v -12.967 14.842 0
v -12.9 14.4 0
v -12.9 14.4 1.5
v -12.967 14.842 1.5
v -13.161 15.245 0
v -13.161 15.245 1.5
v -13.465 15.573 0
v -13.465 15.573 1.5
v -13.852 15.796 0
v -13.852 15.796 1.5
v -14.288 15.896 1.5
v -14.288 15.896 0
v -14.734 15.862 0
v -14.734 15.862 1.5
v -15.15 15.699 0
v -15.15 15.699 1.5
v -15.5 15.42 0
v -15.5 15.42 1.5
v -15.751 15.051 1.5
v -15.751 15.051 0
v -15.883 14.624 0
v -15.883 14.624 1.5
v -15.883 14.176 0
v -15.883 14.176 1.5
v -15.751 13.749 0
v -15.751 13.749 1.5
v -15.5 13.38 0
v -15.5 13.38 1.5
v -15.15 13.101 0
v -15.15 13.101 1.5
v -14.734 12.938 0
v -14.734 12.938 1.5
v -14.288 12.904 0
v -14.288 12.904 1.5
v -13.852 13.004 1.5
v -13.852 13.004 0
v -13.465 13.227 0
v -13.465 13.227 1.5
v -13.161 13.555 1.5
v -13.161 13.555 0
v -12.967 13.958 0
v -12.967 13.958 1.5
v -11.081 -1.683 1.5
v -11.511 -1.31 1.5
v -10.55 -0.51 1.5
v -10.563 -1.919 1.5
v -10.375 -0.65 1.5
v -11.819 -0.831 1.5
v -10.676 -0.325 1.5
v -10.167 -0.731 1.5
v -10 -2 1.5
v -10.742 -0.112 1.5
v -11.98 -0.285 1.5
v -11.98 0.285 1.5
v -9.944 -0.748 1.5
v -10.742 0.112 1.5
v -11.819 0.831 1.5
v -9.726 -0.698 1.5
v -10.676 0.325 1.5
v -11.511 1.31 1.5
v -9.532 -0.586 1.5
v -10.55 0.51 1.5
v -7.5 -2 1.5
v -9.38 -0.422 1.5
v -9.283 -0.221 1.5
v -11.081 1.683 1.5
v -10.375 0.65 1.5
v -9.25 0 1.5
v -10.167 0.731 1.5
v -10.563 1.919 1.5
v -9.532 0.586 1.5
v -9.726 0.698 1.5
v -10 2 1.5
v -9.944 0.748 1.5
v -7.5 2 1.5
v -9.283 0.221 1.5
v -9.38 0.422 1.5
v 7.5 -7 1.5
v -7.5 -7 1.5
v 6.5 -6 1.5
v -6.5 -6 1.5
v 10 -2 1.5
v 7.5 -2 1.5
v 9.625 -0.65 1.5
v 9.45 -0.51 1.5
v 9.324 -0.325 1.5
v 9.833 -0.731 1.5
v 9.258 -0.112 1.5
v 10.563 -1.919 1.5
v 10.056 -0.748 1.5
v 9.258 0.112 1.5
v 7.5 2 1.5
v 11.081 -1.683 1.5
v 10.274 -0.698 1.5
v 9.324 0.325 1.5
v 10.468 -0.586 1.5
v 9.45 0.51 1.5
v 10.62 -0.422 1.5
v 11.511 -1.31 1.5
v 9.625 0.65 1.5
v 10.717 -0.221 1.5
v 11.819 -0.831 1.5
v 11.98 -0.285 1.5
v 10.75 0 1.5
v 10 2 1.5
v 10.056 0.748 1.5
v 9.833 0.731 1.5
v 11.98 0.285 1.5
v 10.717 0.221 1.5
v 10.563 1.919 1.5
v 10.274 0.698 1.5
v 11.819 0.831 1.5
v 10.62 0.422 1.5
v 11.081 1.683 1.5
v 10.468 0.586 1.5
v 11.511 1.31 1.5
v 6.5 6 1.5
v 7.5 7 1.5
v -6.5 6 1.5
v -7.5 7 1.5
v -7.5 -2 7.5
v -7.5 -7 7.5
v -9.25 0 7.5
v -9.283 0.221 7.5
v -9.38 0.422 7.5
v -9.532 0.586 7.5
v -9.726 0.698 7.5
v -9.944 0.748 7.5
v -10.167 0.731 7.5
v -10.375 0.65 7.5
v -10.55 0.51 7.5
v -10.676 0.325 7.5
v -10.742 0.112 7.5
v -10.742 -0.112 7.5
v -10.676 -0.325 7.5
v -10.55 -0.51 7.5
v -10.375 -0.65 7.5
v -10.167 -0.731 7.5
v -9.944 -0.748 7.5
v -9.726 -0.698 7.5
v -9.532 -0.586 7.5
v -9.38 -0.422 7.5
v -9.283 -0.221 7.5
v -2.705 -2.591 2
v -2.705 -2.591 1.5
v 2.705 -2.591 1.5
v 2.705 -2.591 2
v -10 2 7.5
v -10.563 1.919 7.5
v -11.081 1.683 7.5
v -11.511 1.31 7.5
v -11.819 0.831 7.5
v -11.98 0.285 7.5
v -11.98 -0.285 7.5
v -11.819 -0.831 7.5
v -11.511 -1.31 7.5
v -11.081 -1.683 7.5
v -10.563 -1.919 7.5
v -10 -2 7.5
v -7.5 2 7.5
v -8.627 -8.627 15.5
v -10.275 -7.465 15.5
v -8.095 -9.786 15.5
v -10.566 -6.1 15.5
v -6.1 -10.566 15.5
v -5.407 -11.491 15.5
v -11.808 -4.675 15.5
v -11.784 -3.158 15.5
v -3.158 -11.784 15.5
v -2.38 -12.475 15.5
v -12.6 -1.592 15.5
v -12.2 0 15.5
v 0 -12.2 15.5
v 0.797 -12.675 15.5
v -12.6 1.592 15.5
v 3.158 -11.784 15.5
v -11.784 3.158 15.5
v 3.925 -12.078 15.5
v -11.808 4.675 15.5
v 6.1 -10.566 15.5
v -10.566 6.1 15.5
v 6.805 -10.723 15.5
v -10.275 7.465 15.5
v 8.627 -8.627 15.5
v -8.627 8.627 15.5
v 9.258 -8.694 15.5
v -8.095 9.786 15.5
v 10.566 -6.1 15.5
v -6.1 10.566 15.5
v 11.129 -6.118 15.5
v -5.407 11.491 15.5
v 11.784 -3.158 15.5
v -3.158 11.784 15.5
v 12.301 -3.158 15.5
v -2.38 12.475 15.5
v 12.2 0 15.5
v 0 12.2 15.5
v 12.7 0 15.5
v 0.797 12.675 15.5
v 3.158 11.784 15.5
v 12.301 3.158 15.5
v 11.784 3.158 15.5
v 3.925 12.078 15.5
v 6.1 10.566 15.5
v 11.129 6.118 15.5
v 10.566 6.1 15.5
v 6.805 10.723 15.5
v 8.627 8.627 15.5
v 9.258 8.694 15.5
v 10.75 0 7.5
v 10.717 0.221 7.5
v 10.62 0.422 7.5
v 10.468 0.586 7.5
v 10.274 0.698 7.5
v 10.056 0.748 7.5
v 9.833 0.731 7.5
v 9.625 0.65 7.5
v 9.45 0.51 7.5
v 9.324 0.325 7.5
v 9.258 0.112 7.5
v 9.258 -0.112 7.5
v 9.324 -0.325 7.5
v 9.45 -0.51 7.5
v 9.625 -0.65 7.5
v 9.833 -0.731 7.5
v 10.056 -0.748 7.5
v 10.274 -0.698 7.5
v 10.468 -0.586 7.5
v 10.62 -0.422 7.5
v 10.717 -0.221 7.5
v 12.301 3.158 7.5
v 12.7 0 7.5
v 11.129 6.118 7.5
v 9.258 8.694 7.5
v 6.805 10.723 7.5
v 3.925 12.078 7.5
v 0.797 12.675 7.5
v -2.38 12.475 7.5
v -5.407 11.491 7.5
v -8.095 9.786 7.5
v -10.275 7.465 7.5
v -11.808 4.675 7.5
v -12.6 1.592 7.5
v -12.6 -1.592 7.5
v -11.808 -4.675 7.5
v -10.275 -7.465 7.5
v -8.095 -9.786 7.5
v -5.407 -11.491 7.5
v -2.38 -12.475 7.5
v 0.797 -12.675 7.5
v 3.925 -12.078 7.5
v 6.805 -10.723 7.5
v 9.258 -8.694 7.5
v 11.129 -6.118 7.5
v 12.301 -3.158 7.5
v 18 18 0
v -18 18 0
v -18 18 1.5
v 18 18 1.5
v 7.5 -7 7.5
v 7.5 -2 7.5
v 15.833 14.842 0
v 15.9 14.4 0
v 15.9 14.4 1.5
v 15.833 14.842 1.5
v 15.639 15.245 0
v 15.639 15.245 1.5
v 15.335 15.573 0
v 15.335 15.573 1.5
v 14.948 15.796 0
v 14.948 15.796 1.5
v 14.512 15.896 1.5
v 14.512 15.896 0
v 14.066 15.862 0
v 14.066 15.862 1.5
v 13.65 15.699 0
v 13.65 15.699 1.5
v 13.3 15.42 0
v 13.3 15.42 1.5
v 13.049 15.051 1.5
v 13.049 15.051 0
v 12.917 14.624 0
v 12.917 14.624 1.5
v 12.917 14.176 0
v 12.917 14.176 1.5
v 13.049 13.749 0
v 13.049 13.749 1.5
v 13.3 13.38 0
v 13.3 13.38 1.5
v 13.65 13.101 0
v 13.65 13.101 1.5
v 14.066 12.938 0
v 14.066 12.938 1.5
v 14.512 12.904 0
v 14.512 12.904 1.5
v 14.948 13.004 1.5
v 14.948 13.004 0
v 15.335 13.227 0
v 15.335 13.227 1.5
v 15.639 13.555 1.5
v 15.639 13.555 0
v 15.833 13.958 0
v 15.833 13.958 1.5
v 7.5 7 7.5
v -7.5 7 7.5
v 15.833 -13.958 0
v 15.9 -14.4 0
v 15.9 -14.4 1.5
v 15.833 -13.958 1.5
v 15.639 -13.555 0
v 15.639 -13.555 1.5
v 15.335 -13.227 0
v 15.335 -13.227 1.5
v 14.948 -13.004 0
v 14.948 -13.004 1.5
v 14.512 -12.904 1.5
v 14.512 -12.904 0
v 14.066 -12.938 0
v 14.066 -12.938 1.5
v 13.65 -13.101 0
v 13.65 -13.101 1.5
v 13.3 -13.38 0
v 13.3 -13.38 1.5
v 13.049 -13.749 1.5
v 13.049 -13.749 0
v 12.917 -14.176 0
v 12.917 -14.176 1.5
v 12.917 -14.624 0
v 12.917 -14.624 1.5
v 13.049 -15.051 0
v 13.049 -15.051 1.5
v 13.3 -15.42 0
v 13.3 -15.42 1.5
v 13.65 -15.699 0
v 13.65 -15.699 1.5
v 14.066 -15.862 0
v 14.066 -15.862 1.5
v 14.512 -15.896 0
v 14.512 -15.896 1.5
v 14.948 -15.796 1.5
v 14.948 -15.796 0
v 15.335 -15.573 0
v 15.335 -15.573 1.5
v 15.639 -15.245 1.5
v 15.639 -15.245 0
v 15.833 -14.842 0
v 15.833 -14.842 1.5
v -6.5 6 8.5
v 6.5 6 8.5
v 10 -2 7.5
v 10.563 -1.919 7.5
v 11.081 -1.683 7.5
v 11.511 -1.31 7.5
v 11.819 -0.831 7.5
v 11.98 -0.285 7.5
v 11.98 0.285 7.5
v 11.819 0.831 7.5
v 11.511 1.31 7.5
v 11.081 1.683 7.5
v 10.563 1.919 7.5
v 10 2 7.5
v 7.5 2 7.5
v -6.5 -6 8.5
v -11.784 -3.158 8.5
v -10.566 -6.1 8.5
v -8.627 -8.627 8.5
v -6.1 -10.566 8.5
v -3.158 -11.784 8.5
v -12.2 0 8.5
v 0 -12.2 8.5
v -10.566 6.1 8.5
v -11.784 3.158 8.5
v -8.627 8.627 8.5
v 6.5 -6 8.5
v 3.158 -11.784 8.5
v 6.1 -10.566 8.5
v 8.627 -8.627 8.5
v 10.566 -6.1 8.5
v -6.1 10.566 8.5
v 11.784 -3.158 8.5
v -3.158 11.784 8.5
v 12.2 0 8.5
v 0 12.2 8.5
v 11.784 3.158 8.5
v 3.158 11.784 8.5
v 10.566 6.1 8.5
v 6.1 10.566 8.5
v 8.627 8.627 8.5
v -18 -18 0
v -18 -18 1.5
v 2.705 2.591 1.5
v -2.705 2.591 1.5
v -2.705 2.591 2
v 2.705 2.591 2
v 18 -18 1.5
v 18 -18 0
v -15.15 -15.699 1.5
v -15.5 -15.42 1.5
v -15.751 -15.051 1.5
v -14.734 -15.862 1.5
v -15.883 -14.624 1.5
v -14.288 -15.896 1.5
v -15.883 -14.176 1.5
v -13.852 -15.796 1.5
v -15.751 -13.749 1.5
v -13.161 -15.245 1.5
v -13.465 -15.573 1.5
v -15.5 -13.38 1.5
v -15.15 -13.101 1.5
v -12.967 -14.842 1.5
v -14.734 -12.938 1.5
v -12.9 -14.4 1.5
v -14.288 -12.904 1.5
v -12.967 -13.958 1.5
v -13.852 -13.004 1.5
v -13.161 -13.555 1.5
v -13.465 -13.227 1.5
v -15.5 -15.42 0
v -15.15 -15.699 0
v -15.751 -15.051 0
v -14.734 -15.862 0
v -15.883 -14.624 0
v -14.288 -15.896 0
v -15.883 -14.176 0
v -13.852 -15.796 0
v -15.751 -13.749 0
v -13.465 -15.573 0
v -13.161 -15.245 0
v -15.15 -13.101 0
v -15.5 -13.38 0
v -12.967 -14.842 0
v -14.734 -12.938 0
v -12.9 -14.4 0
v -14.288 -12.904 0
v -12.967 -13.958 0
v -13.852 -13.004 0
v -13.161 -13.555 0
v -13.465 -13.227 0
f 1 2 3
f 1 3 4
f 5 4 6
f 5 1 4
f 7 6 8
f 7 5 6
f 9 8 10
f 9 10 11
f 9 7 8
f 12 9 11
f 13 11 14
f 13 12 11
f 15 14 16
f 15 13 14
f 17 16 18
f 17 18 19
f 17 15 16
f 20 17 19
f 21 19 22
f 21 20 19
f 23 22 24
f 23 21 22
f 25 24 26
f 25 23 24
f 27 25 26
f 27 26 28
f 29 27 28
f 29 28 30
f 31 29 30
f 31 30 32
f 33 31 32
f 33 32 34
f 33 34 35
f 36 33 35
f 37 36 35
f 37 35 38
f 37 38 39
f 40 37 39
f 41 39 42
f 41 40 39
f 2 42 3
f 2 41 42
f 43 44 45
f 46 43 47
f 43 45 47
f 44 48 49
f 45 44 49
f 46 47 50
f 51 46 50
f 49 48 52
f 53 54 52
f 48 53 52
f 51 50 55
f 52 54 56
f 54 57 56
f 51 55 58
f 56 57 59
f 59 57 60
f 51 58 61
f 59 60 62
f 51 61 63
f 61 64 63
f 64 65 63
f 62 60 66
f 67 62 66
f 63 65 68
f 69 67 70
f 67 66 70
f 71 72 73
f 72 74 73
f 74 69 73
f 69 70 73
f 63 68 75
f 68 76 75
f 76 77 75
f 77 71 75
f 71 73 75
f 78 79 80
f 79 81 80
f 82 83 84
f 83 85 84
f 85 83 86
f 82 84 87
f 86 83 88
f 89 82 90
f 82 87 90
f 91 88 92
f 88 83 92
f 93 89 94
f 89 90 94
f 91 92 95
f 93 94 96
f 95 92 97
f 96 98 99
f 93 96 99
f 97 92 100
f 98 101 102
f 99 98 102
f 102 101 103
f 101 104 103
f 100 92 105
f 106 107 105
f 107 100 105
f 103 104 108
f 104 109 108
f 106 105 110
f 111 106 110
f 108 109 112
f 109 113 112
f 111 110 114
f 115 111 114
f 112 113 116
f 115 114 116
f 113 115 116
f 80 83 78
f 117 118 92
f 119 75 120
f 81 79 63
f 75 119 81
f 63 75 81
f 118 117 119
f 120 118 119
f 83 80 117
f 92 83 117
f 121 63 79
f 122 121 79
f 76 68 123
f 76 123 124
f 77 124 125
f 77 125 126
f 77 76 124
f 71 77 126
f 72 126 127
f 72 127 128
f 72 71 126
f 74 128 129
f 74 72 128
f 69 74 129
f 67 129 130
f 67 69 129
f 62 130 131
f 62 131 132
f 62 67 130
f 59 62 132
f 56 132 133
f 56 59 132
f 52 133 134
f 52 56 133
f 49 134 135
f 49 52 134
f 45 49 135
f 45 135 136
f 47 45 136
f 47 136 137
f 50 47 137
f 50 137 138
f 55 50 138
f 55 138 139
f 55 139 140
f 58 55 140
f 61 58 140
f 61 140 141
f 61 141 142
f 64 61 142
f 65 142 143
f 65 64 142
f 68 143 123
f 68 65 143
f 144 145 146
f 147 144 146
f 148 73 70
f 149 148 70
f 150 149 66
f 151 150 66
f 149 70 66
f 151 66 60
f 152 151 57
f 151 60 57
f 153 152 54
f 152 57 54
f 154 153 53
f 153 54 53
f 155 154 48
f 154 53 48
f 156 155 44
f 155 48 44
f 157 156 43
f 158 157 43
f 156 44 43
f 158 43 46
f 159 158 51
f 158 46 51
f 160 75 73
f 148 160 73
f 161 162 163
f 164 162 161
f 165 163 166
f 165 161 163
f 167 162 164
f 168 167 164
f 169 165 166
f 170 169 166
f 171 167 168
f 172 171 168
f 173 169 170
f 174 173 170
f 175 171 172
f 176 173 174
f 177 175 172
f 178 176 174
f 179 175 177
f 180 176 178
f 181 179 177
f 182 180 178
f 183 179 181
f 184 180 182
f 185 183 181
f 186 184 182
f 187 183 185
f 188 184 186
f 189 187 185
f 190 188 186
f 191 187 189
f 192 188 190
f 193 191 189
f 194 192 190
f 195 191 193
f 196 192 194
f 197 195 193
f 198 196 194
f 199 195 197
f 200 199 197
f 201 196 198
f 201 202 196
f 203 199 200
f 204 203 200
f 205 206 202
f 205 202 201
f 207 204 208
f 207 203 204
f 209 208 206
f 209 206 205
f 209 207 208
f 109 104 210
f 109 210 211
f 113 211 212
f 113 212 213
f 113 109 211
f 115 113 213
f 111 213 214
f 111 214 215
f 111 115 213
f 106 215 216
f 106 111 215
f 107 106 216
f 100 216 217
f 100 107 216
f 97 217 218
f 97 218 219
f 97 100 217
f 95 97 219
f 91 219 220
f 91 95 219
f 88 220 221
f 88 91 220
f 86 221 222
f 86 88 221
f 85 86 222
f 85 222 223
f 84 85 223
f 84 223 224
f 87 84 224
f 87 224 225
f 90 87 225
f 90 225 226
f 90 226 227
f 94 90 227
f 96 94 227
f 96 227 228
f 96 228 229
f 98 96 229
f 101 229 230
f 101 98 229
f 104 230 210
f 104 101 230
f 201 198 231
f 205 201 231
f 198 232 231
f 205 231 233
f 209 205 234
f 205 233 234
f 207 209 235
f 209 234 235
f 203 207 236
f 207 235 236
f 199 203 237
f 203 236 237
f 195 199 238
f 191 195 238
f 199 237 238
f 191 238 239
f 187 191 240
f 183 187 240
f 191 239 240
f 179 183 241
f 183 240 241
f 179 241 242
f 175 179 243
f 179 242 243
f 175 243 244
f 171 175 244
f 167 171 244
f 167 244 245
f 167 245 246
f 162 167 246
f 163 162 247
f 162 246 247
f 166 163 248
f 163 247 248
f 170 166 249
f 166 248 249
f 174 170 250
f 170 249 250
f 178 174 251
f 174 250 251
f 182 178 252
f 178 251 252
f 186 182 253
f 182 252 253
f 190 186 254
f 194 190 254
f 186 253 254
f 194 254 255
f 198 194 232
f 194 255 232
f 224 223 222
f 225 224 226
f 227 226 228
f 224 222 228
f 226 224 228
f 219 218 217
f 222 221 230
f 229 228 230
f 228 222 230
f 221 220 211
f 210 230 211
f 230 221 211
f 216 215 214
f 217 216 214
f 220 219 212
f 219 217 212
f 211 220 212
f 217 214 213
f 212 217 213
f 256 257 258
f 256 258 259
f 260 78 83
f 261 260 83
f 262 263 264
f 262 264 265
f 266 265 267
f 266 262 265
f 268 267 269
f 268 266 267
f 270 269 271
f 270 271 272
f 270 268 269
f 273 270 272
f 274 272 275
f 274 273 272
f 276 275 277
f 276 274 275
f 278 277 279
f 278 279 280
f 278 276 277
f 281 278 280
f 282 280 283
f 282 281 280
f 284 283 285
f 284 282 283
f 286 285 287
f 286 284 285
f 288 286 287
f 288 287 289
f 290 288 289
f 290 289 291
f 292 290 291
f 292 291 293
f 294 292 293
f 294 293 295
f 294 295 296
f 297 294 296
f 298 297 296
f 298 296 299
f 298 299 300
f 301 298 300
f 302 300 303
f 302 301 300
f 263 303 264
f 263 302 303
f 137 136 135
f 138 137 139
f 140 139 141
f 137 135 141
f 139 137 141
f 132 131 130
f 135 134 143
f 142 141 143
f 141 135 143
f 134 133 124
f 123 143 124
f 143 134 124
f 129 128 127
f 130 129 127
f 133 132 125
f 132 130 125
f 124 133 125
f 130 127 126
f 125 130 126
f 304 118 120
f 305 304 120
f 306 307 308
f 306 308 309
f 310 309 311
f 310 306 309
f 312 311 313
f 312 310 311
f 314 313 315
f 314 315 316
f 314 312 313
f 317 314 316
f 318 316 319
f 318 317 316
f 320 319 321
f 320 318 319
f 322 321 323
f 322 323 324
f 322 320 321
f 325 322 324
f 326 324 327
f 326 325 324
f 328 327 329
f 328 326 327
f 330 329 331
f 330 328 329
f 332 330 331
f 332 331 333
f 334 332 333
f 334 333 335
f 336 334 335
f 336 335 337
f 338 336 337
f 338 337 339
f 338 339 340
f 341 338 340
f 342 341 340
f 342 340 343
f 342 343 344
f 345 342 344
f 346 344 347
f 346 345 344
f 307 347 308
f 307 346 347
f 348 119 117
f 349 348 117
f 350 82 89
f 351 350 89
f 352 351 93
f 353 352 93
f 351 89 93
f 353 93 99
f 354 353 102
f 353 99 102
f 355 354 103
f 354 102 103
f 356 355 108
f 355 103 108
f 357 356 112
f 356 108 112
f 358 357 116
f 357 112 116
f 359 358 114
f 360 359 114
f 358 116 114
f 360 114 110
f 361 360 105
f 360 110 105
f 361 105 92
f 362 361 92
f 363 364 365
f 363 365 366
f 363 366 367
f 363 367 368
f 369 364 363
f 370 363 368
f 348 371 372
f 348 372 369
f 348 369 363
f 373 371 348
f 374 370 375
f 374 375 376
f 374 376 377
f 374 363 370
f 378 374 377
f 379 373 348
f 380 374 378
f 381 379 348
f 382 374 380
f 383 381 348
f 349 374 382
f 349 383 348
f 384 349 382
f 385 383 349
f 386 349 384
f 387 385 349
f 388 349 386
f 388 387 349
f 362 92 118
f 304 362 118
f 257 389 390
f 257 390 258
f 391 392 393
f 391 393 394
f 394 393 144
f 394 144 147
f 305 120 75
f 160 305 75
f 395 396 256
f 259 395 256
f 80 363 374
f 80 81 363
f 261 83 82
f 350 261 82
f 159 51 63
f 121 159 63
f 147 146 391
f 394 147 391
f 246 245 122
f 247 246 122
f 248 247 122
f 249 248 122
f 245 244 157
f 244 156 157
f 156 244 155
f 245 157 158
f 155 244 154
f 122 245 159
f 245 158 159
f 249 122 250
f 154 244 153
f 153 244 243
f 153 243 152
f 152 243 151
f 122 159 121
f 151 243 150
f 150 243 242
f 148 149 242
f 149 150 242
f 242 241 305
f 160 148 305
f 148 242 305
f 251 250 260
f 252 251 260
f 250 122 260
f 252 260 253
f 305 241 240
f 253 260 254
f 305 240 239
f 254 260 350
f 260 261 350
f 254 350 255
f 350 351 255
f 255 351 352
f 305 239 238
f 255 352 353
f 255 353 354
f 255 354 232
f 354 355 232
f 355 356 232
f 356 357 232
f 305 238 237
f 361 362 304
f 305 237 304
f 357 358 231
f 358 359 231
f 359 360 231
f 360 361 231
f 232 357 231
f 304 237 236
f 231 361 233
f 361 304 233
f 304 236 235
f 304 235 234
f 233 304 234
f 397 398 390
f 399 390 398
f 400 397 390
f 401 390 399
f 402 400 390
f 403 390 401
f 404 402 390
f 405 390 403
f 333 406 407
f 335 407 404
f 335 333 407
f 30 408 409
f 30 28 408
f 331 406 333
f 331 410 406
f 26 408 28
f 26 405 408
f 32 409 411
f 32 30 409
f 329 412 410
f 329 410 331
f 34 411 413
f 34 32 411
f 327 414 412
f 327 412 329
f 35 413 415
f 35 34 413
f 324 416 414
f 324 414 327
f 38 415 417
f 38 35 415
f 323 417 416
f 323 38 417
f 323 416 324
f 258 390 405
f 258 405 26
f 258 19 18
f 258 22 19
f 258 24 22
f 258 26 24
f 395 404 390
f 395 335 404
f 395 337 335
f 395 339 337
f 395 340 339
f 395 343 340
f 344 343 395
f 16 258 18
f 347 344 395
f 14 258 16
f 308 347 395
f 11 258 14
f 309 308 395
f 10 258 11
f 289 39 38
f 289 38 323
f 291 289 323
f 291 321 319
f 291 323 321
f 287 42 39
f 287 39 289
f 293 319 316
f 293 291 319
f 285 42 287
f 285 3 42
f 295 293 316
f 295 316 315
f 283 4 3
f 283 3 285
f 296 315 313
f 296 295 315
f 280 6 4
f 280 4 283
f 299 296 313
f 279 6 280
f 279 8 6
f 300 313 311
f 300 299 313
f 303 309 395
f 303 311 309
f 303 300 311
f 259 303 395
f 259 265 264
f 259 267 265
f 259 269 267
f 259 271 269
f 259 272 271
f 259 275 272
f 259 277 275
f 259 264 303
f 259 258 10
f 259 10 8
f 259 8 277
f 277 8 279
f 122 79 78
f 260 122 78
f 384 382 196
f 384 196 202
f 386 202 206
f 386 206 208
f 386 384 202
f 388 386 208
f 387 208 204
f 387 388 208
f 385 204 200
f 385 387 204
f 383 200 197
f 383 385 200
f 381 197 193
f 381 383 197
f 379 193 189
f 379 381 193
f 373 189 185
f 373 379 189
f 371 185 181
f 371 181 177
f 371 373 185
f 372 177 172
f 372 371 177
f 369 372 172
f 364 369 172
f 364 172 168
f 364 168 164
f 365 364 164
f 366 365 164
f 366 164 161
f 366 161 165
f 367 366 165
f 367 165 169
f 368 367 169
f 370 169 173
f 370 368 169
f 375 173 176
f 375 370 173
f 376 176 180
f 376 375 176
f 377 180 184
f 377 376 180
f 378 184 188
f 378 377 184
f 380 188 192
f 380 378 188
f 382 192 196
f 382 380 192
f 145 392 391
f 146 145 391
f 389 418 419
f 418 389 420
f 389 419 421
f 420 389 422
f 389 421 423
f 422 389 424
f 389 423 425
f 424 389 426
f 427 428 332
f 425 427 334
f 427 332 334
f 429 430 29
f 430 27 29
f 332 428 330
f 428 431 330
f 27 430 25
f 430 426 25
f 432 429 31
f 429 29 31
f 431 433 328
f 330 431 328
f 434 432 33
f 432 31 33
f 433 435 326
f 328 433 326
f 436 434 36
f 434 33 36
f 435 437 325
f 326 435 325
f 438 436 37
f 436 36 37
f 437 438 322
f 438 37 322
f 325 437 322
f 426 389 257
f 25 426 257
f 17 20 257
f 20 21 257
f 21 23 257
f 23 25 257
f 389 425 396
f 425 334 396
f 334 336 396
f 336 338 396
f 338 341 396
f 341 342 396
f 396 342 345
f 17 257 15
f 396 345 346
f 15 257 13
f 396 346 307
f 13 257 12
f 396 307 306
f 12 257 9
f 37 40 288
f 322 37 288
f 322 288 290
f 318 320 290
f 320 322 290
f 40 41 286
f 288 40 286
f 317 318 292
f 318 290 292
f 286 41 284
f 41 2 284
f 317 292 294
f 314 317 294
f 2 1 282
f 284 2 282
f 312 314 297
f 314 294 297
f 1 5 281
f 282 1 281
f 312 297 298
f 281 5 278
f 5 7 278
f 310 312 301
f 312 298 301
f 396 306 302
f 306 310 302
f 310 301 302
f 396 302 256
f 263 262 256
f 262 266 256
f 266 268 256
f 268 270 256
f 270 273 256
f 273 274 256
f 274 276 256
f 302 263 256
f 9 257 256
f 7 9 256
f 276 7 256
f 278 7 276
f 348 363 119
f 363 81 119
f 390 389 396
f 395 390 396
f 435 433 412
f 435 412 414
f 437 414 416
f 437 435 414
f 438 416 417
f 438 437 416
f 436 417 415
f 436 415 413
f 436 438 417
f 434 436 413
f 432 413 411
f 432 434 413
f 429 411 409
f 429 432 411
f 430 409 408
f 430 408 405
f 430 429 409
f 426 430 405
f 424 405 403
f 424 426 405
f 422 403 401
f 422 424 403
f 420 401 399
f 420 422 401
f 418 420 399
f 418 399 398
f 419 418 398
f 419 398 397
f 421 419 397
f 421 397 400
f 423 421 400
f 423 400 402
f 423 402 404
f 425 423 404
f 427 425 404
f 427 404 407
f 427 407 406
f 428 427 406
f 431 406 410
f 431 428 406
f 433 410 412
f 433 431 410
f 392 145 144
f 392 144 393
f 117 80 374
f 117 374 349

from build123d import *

# Parameters (mm, degrees)
F0_W     = 36
F0_H     = 36
F0_R     = 1.5
F1_DEPTH = 1.5
F2_W     = 5.409108
F2_H     = 5.18275
F3_DEPTH = 0.5
F4_W     = 13
F4_H     = 12
F4_R     = 0.75
F5_DEPTH = 6
F6_R     = 12.7
F6_W     = 13
F6_H     = 12
F7_DEPTH = 1
F8_R     = 12.7
F8_R_2   = 12.2
F9_DEPTH = 7


with BuildPart() as f1:
    # F0 (on Top) → F1 (new body)
    with BuildSketch(Plane.XY):
        Rectangle(F0_W, F0_H)
        with Locations((-14.4, -14.4)):
            Circle(F0_R, mode=Mode.SUBTRACT)
        with Locations((14.4, -14.4)):
            Circle(F0_R, mode=Mode.SUBTRACT)
        with Locations((-14.4, 14.4)):
            Circle(F0_R, mode=Mode.SUBTRACT)
        with Locations((14.4, 14.4)):
            Circle(F0_R, mode=Mode.SUBTRACT)
    extrude(amount=F1_DEPTH)


with BuildPart() as f3:
    # F2 (on face) → F3 (new body)
    with BuildSketch(Plane.XY.offset(1.5)):
        Rectangle(F2_W, F2_H)
    extrude(amount=F3_DEPTH)


with BuildPart() as f5:
    # F4 (on face) → F5 (new body)
    with BuildSketch(Plane.XY.offset(1.5)):
        Polygon((-7.5, -7), (7.5, -7), (7.5, -2), (7.5, 2), (7.5, 7), (-7.5, 7), (-7.5, 2), (-7.5, -2), align=None)
        Rectangle(F4_W, F4_H, mode=Mode.SUBTRACT)
        with BuildLine():
            Line((-10, -2), (-7.5, -2))
            Line((-7.5, -2), (-7.5, 2))
            Line((-7.5, 2), (-10, 2))
            ThreePointArc((-10, 2), (-12, 0), (-10, -2))
        make_face()
        with Locations((-10, 0)):
            Circle(F4_R, mode=Mode.SUBTRACT)
        with BuildLine():
            Line((7.5, 2), (7.5, -2))
            Line((7.5, -2), (10, -2))
            ThreePointArc((10, -2), (12, 0), (10, 2))
            Line((10, 2), (7.5, 2))
        make_face()
        with Locations((10, 0)):
            Circle(F4_R, mode=Mode.SUBTRACT)
    extrude(amount=F5_DEPTH)

    # F6 (on face) → F7 (join)
    with BuildSketch(Plane.XY.offset(7.5)):
        Circle(F6_R)
        Rectangle(F6_W, F6_H, mode=Mode.SUBTRACT)
    extrude(amount=F7_DEPTH)

    # F8 (on face) → F9 (join)
    with BuildSketch(Plane.XY.offset(8.5)):
        Circle(F8_R)
        Circle(F8_R_2, mode=Mode.SUBTRACT)
    extrude(amount=F9_DEPTH)


solid = Compound([f1.part, f3.part, f5.part])
